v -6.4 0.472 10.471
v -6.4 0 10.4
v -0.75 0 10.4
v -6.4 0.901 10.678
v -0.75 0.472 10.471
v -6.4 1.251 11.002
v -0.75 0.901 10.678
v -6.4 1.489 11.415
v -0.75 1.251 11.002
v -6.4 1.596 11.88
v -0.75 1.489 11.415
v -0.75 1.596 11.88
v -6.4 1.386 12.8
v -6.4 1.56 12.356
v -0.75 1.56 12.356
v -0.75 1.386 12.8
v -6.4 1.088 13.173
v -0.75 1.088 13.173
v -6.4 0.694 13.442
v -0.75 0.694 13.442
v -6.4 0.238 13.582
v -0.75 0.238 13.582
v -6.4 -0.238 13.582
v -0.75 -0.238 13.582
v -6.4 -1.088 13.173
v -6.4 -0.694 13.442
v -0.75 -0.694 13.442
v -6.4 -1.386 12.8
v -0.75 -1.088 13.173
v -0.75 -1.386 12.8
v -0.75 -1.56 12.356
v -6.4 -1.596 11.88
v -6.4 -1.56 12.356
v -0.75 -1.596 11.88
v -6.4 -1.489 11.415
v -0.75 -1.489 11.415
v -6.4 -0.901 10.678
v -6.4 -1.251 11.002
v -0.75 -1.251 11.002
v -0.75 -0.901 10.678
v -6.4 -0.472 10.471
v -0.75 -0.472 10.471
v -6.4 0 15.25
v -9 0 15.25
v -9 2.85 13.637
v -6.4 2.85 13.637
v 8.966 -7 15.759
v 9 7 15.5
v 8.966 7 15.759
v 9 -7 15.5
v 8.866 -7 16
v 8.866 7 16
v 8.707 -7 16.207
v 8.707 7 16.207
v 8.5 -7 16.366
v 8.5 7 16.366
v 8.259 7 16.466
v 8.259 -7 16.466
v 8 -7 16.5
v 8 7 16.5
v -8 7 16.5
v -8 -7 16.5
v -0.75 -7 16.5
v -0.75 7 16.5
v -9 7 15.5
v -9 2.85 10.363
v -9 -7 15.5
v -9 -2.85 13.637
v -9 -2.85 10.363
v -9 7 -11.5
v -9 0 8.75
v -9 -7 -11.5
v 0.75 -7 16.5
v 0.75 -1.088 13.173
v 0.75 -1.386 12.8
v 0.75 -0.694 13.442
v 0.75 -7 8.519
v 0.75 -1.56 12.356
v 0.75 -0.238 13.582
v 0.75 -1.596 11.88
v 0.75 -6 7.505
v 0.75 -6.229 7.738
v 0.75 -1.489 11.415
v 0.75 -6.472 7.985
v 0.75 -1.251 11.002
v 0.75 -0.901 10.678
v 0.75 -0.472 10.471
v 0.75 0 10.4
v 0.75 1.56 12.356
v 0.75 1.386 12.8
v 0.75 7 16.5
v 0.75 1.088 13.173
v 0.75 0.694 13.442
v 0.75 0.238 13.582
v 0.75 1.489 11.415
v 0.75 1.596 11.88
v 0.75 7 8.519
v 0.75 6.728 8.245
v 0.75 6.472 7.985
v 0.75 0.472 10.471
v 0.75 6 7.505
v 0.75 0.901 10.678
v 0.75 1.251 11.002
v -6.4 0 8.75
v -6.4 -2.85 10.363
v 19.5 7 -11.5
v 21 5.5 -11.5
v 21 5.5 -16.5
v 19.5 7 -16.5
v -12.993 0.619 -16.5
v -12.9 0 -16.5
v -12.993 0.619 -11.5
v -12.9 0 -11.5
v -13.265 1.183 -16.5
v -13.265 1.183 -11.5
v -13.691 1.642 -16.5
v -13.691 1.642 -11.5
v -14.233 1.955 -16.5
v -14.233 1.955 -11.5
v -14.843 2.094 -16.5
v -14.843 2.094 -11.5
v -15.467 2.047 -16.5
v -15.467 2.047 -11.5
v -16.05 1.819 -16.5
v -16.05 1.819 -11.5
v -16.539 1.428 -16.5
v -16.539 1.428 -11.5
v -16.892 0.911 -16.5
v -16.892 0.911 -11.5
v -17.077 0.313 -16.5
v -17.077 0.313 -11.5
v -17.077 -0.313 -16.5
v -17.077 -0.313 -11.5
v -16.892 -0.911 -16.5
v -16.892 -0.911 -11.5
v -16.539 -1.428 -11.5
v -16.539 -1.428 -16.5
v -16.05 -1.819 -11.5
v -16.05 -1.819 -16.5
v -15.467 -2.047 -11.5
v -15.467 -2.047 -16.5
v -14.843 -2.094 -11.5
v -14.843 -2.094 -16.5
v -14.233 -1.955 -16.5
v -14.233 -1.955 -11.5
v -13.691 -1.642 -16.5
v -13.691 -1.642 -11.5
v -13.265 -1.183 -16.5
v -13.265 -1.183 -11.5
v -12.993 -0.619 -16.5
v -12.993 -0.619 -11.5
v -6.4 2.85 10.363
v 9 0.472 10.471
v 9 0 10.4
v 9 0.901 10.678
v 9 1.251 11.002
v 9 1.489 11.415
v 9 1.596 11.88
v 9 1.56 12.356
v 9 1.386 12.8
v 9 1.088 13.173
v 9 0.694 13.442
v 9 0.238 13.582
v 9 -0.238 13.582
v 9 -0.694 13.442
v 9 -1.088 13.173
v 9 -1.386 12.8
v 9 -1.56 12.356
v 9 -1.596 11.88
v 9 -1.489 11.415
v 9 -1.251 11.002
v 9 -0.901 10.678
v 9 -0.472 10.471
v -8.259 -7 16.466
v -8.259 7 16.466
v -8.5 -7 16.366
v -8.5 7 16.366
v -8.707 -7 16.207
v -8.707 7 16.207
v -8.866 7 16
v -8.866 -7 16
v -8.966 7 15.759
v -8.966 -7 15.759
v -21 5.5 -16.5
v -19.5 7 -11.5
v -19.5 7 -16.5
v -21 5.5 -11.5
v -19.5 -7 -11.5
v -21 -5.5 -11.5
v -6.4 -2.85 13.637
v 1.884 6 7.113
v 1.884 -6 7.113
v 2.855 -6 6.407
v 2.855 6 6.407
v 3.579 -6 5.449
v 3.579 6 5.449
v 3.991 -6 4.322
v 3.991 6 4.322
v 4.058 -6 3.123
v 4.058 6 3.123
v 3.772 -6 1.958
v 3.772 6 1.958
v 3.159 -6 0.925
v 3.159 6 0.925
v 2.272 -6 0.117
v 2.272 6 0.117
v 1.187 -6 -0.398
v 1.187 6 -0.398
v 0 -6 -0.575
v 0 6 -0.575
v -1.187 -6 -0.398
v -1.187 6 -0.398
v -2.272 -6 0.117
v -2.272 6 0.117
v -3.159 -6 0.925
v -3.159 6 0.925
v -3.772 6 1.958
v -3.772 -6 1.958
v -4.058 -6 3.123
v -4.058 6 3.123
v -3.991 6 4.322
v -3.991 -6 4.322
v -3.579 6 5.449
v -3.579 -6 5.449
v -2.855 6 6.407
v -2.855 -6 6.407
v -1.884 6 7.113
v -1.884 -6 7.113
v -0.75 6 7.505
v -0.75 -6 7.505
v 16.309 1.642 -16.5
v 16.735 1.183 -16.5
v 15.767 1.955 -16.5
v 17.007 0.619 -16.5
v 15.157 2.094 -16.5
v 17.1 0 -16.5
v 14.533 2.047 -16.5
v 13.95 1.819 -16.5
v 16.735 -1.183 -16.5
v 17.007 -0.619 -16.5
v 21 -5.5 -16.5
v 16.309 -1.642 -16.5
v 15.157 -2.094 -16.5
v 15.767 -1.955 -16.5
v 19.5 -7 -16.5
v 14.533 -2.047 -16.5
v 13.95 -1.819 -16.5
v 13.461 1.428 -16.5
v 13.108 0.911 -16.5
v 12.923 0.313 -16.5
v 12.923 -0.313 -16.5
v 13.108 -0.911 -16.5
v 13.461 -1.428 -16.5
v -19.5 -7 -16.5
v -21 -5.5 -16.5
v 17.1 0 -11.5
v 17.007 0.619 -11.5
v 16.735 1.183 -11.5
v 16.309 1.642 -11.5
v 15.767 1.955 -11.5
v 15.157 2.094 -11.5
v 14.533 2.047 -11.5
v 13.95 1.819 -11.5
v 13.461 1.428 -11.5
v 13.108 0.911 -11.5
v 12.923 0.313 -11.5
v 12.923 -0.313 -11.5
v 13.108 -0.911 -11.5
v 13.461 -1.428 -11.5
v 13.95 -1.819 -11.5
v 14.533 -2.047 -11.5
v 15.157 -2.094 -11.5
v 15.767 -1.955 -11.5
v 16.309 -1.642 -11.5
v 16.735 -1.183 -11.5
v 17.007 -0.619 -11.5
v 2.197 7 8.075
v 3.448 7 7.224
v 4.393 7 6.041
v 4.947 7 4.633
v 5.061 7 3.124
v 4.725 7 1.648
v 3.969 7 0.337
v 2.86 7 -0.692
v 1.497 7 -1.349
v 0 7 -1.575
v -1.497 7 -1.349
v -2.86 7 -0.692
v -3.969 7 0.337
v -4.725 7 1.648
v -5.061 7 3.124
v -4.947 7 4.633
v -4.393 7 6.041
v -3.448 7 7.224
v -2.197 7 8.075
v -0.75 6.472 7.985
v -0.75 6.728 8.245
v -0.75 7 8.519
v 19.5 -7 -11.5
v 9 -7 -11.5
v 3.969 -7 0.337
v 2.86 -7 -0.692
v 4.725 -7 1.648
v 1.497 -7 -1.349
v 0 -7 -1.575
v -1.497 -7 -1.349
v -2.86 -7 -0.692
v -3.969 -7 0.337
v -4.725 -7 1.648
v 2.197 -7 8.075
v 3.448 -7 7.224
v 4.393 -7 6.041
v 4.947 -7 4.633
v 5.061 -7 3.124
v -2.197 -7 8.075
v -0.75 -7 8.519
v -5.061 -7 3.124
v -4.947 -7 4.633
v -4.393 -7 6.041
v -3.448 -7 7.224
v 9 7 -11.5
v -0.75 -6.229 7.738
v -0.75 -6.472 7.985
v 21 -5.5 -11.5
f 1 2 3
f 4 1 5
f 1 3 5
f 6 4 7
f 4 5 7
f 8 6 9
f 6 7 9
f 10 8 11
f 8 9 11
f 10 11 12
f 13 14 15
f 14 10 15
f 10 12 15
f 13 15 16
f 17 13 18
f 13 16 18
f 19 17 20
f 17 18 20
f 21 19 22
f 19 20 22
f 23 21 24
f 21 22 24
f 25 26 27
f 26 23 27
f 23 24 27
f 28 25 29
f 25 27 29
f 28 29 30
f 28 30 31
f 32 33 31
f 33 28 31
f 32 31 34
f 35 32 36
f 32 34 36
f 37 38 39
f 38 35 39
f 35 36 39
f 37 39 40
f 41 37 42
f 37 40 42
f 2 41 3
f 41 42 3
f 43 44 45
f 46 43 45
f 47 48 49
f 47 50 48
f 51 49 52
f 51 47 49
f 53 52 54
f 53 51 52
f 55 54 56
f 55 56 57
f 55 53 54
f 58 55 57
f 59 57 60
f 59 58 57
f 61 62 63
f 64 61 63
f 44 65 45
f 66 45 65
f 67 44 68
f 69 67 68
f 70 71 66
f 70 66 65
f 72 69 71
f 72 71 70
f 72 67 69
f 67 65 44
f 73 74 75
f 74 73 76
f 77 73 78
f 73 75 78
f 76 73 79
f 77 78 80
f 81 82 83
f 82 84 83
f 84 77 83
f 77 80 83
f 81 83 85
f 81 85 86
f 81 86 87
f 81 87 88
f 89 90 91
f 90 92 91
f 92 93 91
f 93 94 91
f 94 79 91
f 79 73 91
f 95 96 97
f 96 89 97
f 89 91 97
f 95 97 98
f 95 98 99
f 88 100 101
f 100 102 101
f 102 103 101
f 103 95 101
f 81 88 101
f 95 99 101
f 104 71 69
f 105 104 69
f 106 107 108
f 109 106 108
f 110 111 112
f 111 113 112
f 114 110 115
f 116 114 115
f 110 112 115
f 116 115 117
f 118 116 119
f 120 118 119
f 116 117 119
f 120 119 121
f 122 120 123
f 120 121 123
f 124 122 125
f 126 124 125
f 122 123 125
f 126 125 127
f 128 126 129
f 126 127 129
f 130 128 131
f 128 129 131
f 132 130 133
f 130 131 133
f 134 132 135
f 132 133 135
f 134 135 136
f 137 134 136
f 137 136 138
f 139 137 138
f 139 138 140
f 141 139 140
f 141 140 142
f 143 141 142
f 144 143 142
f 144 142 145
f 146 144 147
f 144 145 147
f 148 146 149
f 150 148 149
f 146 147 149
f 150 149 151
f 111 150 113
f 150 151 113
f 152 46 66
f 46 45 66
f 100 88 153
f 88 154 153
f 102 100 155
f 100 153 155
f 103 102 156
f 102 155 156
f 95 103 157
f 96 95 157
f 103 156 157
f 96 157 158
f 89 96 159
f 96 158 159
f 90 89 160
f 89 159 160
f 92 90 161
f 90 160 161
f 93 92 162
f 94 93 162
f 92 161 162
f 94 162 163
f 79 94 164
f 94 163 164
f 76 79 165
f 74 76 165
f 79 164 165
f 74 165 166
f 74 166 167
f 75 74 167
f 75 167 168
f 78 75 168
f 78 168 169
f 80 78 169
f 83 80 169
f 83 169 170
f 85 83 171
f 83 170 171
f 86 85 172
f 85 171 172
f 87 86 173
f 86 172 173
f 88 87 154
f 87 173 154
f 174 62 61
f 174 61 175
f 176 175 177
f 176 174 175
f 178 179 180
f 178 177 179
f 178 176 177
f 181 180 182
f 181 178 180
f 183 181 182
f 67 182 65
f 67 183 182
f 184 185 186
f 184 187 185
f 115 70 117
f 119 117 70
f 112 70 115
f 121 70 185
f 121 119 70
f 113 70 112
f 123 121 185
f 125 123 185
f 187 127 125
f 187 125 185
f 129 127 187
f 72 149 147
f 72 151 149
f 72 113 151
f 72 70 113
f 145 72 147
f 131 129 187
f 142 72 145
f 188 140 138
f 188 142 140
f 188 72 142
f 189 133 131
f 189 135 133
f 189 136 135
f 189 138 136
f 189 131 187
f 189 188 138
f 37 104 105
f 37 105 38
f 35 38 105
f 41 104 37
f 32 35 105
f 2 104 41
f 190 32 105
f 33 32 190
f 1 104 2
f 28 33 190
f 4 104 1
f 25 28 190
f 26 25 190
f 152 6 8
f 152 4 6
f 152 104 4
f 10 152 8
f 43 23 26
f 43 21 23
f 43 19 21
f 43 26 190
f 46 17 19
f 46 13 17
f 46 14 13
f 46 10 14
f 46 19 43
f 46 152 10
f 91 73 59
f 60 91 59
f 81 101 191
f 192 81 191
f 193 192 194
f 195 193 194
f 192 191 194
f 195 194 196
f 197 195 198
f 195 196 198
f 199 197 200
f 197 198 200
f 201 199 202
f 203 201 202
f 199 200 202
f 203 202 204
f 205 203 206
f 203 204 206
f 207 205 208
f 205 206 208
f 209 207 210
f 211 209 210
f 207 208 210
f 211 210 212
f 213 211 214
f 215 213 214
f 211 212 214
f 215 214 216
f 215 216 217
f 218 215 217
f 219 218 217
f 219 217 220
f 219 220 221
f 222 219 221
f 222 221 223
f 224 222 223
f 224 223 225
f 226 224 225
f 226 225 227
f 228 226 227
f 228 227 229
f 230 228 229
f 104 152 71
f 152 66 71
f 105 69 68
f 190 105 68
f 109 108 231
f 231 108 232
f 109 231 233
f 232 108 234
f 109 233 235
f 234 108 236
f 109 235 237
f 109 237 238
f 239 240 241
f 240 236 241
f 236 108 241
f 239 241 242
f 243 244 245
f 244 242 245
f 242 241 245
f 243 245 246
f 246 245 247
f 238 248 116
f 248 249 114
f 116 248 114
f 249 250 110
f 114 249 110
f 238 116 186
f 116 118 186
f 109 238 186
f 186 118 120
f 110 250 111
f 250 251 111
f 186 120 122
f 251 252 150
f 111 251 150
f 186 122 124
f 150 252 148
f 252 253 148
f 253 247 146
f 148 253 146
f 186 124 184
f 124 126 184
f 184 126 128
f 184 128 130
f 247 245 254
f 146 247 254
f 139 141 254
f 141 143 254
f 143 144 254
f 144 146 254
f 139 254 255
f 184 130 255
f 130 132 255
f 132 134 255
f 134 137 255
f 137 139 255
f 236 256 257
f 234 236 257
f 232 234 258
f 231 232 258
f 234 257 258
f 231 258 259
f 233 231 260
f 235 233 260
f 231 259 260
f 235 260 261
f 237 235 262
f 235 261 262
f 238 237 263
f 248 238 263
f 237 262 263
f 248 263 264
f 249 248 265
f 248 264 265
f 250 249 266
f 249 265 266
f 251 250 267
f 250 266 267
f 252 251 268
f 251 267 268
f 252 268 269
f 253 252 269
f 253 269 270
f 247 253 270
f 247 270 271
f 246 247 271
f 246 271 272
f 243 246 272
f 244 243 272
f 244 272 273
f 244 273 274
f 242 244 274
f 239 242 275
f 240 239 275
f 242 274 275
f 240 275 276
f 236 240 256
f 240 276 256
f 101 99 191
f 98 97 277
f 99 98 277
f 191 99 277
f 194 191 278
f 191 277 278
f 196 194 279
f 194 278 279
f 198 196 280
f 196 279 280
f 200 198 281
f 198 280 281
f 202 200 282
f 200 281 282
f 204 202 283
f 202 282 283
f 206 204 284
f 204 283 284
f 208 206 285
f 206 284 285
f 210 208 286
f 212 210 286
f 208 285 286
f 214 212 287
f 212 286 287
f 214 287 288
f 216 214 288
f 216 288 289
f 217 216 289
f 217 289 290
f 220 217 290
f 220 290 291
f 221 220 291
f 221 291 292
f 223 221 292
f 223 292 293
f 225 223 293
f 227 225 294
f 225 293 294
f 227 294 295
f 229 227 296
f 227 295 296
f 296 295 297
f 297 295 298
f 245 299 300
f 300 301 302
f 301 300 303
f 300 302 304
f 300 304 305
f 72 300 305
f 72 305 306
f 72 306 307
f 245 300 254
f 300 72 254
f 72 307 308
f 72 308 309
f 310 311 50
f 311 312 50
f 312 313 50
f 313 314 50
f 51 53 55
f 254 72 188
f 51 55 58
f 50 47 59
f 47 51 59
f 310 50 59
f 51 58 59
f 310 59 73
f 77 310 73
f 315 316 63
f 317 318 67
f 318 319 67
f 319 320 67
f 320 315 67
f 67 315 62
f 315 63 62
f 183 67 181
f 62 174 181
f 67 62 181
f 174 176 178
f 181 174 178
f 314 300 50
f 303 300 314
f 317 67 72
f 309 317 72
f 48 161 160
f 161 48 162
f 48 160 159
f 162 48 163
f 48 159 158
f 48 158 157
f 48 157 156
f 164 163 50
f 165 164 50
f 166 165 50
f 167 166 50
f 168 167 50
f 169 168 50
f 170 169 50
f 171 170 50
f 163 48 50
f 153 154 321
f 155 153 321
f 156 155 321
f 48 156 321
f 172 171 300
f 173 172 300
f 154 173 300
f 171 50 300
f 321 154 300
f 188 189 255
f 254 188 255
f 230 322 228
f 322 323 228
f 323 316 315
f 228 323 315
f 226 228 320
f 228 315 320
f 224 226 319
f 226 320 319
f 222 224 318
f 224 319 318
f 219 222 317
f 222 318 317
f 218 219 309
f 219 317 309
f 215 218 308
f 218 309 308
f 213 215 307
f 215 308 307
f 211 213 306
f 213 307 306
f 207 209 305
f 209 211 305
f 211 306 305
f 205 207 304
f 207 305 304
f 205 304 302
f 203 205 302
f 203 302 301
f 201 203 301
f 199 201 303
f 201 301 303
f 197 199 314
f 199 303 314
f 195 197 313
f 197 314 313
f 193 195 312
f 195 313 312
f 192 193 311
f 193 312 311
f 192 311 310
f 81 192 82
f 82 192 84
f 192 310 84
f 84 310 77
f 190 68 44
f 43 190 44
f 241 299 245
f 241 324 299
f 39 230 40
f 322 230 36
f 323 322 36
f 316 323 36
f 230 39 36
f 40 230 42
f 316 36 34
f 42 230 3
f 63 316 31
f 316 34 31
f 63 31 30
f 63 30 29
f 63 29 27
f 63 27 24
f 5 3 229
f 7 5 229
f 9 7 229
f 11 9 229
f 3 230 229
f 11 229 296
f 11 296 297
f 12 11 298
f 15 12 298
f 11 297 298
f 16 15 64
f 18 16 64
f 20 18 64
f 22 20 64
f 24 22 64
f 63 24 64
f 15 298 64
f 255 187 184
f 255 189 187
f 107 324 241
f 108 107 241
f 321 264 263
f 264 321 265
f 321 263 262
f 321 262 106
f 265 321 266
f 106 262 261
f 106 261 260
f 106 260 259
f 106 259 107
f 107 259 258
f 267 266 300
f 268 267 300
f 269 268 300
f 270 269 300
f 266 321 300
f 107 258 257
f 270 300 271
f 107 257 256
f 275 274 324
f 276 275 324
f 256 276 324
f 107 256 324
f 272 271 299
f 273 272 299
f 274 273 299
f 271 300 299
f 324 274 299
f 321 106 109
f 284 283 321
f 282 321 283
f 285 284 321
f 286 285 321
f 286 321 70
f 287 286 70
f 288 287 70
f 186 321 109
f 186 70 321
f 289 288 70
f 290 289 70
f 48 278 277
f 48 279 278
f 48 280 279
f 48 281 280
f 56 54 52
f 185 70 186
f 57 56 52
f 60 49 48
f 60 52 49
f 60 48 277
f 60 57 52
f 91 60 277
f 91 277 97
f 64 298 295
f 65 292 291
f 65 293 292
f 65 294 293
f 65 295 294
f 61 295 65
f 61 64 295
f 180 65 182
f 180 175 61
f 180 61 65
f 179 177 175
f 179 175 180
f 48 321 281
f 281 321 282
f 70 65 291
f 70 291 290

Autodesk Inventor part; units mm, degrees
ref_plane "YZ Plane" through (0, 0, 0) normal (1, 0, 0) x (0, 1, 0)
ref_plane "XZ Plane" through (0, 0, 0) normal (0, 1, 0) x (-1, 0, 0)
ref_plane "XY Plane" through (0, 0, 0) normal (0, 0, 1) x (1, 0, 0)
sketch "Sketch1" plane through (0, 0, 0) normal (0, 1, 0) x (-1, 0, 0)
  line L0 (-21, -11.5) -> (-21, -16.5)
  line L1 (-21, -16.5) -> (0, -16.5)
  line L2 (0, -16.5) -> (0, 16.5) construction
  line L3 (0, 16.5) -> (-9, 16.5)
  line L4 (-9, 16.5) -> (-9, -11.5)
  line L5 (-9, -11.5) -> (-21, -11.5)
  line L6 (21, -11.5) -> (21, -16.5)
  line L7 (21, -16.5) -> (0, -16.5)
  line L8 (0, 16.5) -> (9, 16.5)
  line L9 (9, 16.5) -> (9, -11.5)
  line L10 (9, -11.5) -> (21, -11.5)
  point P0 (0, 0)
  point P1 (0, 0)
  dimension "d0" = 5
  dimension "d1" = 33
  dimension "d2" = 21
  dimension "d3" = 9
extrude "Extrusion1" add sketch "Sketch1" along normal mid plane 14
sketch "Sketch2" plane through (0, 7, 0) normal (0, 1, 0) x (1, 0, 0)
  arc A0 (0.75, -7.5054) -> (-0.75, -7.5054) centre (0, -3.5) ccw
  line L0 (-0.75, -16.5) -> (0.75, -16.5)
  line L1 (0.75, -16.5) -> (0.75, -7.5054)
  line L2 (-0.75, -7.5054) -> (-0.75, -16.5)
  line L3 (-9, -16.5) -> (9, -16.5) projected
  point P0 (0, 0)
  point P1 (0, -16.5)
  dimension "d6" = 8.15
  dimension "d7" = 13
  dimension "d8" = 1.5
extrude "Extrusion2" cut sketch "Sketch2" against normal through all
sketch "Sketch3" plane through (9, -7, -11.5) normal (1, 0, 0) x (0, 0, -1)
  circle A0 centre (-23.5, 7) radius 1.6
  line L0 (-28, 0) -> (-28, 14) projected
  point P0 (-11.5, 7)
  dimension "d11" = 3.2
  dimension "d13" = 4.5
extrude "Extrusion3" cut sketch "Sketch3" against normal through all
sketch "Sketch4" plane through (-9, -7, 16.5) normal (-1, 0, 0) x (0, 0, 1)
  circle A0 centre (-4.5, 7) radius 1.6 projected
  line L0 (-6.1373, 4.15) -> (-2.8627, 4.15)
  line L1 (-2.8627, 4.15) -> (-1.25, 7)
  line L2 (-1.25, 7) -> (-2.8627, 9.85)
  line L3 (-2.8627, 9.85) -> (-6.1373, 9.85)
  line L4 (-6.1373, 9.85) -> (-7.75, 7)
  line L5 (-7.75, 7) -> (-6.1373, 4.15)
  point P0 (-16.5, 7)
  point P1 (-4.5, 4.15)
  point P2 (-4.5, 9.85)
  dimension "d16" = 5.7
  dimension "d17" = 6.5
extrude "Extrusion4" cut sketch "Sketch4" against normal blind 2.6
sketch "Sketch5" plane through (-21, 7, -11.5) normal (0, 0, 1) x (1, 0, 0)
  circle A0 centre (6, -7) radius 2.1
  circle A1 centre (36, -7) radius 2.1
  line L0 (0, -14) -> (0, 0) projected
  line L1 (0, 0) -> (12, 0) projected
  line L2 (30, 0) -> (42, 0) projected
  point P0 (21, -7)
  point P1 (0, -7)
  point P2 (6, 0)
  point P3 (36, 0)
  dimension "d20" = 4.2
extrude "Extrusion5" cut sketch "Sketch5" against normal through all
chamfer "Chamfer2" distance 1.5 angle 45 4 edges at (-21, 7, -14) (-21, -7, -14) (21, 7, -14) (21, -7, -14)
fillet "Fillet1" radius 1 2 edges at (-9, 0, 16.5) (9, 0, 16.5)
chamfer "Chamfer3" distance 1 angle 45 2 edges at (0, -7, -0.575) (0, 7, -0.575)
properties part number "SH8"
